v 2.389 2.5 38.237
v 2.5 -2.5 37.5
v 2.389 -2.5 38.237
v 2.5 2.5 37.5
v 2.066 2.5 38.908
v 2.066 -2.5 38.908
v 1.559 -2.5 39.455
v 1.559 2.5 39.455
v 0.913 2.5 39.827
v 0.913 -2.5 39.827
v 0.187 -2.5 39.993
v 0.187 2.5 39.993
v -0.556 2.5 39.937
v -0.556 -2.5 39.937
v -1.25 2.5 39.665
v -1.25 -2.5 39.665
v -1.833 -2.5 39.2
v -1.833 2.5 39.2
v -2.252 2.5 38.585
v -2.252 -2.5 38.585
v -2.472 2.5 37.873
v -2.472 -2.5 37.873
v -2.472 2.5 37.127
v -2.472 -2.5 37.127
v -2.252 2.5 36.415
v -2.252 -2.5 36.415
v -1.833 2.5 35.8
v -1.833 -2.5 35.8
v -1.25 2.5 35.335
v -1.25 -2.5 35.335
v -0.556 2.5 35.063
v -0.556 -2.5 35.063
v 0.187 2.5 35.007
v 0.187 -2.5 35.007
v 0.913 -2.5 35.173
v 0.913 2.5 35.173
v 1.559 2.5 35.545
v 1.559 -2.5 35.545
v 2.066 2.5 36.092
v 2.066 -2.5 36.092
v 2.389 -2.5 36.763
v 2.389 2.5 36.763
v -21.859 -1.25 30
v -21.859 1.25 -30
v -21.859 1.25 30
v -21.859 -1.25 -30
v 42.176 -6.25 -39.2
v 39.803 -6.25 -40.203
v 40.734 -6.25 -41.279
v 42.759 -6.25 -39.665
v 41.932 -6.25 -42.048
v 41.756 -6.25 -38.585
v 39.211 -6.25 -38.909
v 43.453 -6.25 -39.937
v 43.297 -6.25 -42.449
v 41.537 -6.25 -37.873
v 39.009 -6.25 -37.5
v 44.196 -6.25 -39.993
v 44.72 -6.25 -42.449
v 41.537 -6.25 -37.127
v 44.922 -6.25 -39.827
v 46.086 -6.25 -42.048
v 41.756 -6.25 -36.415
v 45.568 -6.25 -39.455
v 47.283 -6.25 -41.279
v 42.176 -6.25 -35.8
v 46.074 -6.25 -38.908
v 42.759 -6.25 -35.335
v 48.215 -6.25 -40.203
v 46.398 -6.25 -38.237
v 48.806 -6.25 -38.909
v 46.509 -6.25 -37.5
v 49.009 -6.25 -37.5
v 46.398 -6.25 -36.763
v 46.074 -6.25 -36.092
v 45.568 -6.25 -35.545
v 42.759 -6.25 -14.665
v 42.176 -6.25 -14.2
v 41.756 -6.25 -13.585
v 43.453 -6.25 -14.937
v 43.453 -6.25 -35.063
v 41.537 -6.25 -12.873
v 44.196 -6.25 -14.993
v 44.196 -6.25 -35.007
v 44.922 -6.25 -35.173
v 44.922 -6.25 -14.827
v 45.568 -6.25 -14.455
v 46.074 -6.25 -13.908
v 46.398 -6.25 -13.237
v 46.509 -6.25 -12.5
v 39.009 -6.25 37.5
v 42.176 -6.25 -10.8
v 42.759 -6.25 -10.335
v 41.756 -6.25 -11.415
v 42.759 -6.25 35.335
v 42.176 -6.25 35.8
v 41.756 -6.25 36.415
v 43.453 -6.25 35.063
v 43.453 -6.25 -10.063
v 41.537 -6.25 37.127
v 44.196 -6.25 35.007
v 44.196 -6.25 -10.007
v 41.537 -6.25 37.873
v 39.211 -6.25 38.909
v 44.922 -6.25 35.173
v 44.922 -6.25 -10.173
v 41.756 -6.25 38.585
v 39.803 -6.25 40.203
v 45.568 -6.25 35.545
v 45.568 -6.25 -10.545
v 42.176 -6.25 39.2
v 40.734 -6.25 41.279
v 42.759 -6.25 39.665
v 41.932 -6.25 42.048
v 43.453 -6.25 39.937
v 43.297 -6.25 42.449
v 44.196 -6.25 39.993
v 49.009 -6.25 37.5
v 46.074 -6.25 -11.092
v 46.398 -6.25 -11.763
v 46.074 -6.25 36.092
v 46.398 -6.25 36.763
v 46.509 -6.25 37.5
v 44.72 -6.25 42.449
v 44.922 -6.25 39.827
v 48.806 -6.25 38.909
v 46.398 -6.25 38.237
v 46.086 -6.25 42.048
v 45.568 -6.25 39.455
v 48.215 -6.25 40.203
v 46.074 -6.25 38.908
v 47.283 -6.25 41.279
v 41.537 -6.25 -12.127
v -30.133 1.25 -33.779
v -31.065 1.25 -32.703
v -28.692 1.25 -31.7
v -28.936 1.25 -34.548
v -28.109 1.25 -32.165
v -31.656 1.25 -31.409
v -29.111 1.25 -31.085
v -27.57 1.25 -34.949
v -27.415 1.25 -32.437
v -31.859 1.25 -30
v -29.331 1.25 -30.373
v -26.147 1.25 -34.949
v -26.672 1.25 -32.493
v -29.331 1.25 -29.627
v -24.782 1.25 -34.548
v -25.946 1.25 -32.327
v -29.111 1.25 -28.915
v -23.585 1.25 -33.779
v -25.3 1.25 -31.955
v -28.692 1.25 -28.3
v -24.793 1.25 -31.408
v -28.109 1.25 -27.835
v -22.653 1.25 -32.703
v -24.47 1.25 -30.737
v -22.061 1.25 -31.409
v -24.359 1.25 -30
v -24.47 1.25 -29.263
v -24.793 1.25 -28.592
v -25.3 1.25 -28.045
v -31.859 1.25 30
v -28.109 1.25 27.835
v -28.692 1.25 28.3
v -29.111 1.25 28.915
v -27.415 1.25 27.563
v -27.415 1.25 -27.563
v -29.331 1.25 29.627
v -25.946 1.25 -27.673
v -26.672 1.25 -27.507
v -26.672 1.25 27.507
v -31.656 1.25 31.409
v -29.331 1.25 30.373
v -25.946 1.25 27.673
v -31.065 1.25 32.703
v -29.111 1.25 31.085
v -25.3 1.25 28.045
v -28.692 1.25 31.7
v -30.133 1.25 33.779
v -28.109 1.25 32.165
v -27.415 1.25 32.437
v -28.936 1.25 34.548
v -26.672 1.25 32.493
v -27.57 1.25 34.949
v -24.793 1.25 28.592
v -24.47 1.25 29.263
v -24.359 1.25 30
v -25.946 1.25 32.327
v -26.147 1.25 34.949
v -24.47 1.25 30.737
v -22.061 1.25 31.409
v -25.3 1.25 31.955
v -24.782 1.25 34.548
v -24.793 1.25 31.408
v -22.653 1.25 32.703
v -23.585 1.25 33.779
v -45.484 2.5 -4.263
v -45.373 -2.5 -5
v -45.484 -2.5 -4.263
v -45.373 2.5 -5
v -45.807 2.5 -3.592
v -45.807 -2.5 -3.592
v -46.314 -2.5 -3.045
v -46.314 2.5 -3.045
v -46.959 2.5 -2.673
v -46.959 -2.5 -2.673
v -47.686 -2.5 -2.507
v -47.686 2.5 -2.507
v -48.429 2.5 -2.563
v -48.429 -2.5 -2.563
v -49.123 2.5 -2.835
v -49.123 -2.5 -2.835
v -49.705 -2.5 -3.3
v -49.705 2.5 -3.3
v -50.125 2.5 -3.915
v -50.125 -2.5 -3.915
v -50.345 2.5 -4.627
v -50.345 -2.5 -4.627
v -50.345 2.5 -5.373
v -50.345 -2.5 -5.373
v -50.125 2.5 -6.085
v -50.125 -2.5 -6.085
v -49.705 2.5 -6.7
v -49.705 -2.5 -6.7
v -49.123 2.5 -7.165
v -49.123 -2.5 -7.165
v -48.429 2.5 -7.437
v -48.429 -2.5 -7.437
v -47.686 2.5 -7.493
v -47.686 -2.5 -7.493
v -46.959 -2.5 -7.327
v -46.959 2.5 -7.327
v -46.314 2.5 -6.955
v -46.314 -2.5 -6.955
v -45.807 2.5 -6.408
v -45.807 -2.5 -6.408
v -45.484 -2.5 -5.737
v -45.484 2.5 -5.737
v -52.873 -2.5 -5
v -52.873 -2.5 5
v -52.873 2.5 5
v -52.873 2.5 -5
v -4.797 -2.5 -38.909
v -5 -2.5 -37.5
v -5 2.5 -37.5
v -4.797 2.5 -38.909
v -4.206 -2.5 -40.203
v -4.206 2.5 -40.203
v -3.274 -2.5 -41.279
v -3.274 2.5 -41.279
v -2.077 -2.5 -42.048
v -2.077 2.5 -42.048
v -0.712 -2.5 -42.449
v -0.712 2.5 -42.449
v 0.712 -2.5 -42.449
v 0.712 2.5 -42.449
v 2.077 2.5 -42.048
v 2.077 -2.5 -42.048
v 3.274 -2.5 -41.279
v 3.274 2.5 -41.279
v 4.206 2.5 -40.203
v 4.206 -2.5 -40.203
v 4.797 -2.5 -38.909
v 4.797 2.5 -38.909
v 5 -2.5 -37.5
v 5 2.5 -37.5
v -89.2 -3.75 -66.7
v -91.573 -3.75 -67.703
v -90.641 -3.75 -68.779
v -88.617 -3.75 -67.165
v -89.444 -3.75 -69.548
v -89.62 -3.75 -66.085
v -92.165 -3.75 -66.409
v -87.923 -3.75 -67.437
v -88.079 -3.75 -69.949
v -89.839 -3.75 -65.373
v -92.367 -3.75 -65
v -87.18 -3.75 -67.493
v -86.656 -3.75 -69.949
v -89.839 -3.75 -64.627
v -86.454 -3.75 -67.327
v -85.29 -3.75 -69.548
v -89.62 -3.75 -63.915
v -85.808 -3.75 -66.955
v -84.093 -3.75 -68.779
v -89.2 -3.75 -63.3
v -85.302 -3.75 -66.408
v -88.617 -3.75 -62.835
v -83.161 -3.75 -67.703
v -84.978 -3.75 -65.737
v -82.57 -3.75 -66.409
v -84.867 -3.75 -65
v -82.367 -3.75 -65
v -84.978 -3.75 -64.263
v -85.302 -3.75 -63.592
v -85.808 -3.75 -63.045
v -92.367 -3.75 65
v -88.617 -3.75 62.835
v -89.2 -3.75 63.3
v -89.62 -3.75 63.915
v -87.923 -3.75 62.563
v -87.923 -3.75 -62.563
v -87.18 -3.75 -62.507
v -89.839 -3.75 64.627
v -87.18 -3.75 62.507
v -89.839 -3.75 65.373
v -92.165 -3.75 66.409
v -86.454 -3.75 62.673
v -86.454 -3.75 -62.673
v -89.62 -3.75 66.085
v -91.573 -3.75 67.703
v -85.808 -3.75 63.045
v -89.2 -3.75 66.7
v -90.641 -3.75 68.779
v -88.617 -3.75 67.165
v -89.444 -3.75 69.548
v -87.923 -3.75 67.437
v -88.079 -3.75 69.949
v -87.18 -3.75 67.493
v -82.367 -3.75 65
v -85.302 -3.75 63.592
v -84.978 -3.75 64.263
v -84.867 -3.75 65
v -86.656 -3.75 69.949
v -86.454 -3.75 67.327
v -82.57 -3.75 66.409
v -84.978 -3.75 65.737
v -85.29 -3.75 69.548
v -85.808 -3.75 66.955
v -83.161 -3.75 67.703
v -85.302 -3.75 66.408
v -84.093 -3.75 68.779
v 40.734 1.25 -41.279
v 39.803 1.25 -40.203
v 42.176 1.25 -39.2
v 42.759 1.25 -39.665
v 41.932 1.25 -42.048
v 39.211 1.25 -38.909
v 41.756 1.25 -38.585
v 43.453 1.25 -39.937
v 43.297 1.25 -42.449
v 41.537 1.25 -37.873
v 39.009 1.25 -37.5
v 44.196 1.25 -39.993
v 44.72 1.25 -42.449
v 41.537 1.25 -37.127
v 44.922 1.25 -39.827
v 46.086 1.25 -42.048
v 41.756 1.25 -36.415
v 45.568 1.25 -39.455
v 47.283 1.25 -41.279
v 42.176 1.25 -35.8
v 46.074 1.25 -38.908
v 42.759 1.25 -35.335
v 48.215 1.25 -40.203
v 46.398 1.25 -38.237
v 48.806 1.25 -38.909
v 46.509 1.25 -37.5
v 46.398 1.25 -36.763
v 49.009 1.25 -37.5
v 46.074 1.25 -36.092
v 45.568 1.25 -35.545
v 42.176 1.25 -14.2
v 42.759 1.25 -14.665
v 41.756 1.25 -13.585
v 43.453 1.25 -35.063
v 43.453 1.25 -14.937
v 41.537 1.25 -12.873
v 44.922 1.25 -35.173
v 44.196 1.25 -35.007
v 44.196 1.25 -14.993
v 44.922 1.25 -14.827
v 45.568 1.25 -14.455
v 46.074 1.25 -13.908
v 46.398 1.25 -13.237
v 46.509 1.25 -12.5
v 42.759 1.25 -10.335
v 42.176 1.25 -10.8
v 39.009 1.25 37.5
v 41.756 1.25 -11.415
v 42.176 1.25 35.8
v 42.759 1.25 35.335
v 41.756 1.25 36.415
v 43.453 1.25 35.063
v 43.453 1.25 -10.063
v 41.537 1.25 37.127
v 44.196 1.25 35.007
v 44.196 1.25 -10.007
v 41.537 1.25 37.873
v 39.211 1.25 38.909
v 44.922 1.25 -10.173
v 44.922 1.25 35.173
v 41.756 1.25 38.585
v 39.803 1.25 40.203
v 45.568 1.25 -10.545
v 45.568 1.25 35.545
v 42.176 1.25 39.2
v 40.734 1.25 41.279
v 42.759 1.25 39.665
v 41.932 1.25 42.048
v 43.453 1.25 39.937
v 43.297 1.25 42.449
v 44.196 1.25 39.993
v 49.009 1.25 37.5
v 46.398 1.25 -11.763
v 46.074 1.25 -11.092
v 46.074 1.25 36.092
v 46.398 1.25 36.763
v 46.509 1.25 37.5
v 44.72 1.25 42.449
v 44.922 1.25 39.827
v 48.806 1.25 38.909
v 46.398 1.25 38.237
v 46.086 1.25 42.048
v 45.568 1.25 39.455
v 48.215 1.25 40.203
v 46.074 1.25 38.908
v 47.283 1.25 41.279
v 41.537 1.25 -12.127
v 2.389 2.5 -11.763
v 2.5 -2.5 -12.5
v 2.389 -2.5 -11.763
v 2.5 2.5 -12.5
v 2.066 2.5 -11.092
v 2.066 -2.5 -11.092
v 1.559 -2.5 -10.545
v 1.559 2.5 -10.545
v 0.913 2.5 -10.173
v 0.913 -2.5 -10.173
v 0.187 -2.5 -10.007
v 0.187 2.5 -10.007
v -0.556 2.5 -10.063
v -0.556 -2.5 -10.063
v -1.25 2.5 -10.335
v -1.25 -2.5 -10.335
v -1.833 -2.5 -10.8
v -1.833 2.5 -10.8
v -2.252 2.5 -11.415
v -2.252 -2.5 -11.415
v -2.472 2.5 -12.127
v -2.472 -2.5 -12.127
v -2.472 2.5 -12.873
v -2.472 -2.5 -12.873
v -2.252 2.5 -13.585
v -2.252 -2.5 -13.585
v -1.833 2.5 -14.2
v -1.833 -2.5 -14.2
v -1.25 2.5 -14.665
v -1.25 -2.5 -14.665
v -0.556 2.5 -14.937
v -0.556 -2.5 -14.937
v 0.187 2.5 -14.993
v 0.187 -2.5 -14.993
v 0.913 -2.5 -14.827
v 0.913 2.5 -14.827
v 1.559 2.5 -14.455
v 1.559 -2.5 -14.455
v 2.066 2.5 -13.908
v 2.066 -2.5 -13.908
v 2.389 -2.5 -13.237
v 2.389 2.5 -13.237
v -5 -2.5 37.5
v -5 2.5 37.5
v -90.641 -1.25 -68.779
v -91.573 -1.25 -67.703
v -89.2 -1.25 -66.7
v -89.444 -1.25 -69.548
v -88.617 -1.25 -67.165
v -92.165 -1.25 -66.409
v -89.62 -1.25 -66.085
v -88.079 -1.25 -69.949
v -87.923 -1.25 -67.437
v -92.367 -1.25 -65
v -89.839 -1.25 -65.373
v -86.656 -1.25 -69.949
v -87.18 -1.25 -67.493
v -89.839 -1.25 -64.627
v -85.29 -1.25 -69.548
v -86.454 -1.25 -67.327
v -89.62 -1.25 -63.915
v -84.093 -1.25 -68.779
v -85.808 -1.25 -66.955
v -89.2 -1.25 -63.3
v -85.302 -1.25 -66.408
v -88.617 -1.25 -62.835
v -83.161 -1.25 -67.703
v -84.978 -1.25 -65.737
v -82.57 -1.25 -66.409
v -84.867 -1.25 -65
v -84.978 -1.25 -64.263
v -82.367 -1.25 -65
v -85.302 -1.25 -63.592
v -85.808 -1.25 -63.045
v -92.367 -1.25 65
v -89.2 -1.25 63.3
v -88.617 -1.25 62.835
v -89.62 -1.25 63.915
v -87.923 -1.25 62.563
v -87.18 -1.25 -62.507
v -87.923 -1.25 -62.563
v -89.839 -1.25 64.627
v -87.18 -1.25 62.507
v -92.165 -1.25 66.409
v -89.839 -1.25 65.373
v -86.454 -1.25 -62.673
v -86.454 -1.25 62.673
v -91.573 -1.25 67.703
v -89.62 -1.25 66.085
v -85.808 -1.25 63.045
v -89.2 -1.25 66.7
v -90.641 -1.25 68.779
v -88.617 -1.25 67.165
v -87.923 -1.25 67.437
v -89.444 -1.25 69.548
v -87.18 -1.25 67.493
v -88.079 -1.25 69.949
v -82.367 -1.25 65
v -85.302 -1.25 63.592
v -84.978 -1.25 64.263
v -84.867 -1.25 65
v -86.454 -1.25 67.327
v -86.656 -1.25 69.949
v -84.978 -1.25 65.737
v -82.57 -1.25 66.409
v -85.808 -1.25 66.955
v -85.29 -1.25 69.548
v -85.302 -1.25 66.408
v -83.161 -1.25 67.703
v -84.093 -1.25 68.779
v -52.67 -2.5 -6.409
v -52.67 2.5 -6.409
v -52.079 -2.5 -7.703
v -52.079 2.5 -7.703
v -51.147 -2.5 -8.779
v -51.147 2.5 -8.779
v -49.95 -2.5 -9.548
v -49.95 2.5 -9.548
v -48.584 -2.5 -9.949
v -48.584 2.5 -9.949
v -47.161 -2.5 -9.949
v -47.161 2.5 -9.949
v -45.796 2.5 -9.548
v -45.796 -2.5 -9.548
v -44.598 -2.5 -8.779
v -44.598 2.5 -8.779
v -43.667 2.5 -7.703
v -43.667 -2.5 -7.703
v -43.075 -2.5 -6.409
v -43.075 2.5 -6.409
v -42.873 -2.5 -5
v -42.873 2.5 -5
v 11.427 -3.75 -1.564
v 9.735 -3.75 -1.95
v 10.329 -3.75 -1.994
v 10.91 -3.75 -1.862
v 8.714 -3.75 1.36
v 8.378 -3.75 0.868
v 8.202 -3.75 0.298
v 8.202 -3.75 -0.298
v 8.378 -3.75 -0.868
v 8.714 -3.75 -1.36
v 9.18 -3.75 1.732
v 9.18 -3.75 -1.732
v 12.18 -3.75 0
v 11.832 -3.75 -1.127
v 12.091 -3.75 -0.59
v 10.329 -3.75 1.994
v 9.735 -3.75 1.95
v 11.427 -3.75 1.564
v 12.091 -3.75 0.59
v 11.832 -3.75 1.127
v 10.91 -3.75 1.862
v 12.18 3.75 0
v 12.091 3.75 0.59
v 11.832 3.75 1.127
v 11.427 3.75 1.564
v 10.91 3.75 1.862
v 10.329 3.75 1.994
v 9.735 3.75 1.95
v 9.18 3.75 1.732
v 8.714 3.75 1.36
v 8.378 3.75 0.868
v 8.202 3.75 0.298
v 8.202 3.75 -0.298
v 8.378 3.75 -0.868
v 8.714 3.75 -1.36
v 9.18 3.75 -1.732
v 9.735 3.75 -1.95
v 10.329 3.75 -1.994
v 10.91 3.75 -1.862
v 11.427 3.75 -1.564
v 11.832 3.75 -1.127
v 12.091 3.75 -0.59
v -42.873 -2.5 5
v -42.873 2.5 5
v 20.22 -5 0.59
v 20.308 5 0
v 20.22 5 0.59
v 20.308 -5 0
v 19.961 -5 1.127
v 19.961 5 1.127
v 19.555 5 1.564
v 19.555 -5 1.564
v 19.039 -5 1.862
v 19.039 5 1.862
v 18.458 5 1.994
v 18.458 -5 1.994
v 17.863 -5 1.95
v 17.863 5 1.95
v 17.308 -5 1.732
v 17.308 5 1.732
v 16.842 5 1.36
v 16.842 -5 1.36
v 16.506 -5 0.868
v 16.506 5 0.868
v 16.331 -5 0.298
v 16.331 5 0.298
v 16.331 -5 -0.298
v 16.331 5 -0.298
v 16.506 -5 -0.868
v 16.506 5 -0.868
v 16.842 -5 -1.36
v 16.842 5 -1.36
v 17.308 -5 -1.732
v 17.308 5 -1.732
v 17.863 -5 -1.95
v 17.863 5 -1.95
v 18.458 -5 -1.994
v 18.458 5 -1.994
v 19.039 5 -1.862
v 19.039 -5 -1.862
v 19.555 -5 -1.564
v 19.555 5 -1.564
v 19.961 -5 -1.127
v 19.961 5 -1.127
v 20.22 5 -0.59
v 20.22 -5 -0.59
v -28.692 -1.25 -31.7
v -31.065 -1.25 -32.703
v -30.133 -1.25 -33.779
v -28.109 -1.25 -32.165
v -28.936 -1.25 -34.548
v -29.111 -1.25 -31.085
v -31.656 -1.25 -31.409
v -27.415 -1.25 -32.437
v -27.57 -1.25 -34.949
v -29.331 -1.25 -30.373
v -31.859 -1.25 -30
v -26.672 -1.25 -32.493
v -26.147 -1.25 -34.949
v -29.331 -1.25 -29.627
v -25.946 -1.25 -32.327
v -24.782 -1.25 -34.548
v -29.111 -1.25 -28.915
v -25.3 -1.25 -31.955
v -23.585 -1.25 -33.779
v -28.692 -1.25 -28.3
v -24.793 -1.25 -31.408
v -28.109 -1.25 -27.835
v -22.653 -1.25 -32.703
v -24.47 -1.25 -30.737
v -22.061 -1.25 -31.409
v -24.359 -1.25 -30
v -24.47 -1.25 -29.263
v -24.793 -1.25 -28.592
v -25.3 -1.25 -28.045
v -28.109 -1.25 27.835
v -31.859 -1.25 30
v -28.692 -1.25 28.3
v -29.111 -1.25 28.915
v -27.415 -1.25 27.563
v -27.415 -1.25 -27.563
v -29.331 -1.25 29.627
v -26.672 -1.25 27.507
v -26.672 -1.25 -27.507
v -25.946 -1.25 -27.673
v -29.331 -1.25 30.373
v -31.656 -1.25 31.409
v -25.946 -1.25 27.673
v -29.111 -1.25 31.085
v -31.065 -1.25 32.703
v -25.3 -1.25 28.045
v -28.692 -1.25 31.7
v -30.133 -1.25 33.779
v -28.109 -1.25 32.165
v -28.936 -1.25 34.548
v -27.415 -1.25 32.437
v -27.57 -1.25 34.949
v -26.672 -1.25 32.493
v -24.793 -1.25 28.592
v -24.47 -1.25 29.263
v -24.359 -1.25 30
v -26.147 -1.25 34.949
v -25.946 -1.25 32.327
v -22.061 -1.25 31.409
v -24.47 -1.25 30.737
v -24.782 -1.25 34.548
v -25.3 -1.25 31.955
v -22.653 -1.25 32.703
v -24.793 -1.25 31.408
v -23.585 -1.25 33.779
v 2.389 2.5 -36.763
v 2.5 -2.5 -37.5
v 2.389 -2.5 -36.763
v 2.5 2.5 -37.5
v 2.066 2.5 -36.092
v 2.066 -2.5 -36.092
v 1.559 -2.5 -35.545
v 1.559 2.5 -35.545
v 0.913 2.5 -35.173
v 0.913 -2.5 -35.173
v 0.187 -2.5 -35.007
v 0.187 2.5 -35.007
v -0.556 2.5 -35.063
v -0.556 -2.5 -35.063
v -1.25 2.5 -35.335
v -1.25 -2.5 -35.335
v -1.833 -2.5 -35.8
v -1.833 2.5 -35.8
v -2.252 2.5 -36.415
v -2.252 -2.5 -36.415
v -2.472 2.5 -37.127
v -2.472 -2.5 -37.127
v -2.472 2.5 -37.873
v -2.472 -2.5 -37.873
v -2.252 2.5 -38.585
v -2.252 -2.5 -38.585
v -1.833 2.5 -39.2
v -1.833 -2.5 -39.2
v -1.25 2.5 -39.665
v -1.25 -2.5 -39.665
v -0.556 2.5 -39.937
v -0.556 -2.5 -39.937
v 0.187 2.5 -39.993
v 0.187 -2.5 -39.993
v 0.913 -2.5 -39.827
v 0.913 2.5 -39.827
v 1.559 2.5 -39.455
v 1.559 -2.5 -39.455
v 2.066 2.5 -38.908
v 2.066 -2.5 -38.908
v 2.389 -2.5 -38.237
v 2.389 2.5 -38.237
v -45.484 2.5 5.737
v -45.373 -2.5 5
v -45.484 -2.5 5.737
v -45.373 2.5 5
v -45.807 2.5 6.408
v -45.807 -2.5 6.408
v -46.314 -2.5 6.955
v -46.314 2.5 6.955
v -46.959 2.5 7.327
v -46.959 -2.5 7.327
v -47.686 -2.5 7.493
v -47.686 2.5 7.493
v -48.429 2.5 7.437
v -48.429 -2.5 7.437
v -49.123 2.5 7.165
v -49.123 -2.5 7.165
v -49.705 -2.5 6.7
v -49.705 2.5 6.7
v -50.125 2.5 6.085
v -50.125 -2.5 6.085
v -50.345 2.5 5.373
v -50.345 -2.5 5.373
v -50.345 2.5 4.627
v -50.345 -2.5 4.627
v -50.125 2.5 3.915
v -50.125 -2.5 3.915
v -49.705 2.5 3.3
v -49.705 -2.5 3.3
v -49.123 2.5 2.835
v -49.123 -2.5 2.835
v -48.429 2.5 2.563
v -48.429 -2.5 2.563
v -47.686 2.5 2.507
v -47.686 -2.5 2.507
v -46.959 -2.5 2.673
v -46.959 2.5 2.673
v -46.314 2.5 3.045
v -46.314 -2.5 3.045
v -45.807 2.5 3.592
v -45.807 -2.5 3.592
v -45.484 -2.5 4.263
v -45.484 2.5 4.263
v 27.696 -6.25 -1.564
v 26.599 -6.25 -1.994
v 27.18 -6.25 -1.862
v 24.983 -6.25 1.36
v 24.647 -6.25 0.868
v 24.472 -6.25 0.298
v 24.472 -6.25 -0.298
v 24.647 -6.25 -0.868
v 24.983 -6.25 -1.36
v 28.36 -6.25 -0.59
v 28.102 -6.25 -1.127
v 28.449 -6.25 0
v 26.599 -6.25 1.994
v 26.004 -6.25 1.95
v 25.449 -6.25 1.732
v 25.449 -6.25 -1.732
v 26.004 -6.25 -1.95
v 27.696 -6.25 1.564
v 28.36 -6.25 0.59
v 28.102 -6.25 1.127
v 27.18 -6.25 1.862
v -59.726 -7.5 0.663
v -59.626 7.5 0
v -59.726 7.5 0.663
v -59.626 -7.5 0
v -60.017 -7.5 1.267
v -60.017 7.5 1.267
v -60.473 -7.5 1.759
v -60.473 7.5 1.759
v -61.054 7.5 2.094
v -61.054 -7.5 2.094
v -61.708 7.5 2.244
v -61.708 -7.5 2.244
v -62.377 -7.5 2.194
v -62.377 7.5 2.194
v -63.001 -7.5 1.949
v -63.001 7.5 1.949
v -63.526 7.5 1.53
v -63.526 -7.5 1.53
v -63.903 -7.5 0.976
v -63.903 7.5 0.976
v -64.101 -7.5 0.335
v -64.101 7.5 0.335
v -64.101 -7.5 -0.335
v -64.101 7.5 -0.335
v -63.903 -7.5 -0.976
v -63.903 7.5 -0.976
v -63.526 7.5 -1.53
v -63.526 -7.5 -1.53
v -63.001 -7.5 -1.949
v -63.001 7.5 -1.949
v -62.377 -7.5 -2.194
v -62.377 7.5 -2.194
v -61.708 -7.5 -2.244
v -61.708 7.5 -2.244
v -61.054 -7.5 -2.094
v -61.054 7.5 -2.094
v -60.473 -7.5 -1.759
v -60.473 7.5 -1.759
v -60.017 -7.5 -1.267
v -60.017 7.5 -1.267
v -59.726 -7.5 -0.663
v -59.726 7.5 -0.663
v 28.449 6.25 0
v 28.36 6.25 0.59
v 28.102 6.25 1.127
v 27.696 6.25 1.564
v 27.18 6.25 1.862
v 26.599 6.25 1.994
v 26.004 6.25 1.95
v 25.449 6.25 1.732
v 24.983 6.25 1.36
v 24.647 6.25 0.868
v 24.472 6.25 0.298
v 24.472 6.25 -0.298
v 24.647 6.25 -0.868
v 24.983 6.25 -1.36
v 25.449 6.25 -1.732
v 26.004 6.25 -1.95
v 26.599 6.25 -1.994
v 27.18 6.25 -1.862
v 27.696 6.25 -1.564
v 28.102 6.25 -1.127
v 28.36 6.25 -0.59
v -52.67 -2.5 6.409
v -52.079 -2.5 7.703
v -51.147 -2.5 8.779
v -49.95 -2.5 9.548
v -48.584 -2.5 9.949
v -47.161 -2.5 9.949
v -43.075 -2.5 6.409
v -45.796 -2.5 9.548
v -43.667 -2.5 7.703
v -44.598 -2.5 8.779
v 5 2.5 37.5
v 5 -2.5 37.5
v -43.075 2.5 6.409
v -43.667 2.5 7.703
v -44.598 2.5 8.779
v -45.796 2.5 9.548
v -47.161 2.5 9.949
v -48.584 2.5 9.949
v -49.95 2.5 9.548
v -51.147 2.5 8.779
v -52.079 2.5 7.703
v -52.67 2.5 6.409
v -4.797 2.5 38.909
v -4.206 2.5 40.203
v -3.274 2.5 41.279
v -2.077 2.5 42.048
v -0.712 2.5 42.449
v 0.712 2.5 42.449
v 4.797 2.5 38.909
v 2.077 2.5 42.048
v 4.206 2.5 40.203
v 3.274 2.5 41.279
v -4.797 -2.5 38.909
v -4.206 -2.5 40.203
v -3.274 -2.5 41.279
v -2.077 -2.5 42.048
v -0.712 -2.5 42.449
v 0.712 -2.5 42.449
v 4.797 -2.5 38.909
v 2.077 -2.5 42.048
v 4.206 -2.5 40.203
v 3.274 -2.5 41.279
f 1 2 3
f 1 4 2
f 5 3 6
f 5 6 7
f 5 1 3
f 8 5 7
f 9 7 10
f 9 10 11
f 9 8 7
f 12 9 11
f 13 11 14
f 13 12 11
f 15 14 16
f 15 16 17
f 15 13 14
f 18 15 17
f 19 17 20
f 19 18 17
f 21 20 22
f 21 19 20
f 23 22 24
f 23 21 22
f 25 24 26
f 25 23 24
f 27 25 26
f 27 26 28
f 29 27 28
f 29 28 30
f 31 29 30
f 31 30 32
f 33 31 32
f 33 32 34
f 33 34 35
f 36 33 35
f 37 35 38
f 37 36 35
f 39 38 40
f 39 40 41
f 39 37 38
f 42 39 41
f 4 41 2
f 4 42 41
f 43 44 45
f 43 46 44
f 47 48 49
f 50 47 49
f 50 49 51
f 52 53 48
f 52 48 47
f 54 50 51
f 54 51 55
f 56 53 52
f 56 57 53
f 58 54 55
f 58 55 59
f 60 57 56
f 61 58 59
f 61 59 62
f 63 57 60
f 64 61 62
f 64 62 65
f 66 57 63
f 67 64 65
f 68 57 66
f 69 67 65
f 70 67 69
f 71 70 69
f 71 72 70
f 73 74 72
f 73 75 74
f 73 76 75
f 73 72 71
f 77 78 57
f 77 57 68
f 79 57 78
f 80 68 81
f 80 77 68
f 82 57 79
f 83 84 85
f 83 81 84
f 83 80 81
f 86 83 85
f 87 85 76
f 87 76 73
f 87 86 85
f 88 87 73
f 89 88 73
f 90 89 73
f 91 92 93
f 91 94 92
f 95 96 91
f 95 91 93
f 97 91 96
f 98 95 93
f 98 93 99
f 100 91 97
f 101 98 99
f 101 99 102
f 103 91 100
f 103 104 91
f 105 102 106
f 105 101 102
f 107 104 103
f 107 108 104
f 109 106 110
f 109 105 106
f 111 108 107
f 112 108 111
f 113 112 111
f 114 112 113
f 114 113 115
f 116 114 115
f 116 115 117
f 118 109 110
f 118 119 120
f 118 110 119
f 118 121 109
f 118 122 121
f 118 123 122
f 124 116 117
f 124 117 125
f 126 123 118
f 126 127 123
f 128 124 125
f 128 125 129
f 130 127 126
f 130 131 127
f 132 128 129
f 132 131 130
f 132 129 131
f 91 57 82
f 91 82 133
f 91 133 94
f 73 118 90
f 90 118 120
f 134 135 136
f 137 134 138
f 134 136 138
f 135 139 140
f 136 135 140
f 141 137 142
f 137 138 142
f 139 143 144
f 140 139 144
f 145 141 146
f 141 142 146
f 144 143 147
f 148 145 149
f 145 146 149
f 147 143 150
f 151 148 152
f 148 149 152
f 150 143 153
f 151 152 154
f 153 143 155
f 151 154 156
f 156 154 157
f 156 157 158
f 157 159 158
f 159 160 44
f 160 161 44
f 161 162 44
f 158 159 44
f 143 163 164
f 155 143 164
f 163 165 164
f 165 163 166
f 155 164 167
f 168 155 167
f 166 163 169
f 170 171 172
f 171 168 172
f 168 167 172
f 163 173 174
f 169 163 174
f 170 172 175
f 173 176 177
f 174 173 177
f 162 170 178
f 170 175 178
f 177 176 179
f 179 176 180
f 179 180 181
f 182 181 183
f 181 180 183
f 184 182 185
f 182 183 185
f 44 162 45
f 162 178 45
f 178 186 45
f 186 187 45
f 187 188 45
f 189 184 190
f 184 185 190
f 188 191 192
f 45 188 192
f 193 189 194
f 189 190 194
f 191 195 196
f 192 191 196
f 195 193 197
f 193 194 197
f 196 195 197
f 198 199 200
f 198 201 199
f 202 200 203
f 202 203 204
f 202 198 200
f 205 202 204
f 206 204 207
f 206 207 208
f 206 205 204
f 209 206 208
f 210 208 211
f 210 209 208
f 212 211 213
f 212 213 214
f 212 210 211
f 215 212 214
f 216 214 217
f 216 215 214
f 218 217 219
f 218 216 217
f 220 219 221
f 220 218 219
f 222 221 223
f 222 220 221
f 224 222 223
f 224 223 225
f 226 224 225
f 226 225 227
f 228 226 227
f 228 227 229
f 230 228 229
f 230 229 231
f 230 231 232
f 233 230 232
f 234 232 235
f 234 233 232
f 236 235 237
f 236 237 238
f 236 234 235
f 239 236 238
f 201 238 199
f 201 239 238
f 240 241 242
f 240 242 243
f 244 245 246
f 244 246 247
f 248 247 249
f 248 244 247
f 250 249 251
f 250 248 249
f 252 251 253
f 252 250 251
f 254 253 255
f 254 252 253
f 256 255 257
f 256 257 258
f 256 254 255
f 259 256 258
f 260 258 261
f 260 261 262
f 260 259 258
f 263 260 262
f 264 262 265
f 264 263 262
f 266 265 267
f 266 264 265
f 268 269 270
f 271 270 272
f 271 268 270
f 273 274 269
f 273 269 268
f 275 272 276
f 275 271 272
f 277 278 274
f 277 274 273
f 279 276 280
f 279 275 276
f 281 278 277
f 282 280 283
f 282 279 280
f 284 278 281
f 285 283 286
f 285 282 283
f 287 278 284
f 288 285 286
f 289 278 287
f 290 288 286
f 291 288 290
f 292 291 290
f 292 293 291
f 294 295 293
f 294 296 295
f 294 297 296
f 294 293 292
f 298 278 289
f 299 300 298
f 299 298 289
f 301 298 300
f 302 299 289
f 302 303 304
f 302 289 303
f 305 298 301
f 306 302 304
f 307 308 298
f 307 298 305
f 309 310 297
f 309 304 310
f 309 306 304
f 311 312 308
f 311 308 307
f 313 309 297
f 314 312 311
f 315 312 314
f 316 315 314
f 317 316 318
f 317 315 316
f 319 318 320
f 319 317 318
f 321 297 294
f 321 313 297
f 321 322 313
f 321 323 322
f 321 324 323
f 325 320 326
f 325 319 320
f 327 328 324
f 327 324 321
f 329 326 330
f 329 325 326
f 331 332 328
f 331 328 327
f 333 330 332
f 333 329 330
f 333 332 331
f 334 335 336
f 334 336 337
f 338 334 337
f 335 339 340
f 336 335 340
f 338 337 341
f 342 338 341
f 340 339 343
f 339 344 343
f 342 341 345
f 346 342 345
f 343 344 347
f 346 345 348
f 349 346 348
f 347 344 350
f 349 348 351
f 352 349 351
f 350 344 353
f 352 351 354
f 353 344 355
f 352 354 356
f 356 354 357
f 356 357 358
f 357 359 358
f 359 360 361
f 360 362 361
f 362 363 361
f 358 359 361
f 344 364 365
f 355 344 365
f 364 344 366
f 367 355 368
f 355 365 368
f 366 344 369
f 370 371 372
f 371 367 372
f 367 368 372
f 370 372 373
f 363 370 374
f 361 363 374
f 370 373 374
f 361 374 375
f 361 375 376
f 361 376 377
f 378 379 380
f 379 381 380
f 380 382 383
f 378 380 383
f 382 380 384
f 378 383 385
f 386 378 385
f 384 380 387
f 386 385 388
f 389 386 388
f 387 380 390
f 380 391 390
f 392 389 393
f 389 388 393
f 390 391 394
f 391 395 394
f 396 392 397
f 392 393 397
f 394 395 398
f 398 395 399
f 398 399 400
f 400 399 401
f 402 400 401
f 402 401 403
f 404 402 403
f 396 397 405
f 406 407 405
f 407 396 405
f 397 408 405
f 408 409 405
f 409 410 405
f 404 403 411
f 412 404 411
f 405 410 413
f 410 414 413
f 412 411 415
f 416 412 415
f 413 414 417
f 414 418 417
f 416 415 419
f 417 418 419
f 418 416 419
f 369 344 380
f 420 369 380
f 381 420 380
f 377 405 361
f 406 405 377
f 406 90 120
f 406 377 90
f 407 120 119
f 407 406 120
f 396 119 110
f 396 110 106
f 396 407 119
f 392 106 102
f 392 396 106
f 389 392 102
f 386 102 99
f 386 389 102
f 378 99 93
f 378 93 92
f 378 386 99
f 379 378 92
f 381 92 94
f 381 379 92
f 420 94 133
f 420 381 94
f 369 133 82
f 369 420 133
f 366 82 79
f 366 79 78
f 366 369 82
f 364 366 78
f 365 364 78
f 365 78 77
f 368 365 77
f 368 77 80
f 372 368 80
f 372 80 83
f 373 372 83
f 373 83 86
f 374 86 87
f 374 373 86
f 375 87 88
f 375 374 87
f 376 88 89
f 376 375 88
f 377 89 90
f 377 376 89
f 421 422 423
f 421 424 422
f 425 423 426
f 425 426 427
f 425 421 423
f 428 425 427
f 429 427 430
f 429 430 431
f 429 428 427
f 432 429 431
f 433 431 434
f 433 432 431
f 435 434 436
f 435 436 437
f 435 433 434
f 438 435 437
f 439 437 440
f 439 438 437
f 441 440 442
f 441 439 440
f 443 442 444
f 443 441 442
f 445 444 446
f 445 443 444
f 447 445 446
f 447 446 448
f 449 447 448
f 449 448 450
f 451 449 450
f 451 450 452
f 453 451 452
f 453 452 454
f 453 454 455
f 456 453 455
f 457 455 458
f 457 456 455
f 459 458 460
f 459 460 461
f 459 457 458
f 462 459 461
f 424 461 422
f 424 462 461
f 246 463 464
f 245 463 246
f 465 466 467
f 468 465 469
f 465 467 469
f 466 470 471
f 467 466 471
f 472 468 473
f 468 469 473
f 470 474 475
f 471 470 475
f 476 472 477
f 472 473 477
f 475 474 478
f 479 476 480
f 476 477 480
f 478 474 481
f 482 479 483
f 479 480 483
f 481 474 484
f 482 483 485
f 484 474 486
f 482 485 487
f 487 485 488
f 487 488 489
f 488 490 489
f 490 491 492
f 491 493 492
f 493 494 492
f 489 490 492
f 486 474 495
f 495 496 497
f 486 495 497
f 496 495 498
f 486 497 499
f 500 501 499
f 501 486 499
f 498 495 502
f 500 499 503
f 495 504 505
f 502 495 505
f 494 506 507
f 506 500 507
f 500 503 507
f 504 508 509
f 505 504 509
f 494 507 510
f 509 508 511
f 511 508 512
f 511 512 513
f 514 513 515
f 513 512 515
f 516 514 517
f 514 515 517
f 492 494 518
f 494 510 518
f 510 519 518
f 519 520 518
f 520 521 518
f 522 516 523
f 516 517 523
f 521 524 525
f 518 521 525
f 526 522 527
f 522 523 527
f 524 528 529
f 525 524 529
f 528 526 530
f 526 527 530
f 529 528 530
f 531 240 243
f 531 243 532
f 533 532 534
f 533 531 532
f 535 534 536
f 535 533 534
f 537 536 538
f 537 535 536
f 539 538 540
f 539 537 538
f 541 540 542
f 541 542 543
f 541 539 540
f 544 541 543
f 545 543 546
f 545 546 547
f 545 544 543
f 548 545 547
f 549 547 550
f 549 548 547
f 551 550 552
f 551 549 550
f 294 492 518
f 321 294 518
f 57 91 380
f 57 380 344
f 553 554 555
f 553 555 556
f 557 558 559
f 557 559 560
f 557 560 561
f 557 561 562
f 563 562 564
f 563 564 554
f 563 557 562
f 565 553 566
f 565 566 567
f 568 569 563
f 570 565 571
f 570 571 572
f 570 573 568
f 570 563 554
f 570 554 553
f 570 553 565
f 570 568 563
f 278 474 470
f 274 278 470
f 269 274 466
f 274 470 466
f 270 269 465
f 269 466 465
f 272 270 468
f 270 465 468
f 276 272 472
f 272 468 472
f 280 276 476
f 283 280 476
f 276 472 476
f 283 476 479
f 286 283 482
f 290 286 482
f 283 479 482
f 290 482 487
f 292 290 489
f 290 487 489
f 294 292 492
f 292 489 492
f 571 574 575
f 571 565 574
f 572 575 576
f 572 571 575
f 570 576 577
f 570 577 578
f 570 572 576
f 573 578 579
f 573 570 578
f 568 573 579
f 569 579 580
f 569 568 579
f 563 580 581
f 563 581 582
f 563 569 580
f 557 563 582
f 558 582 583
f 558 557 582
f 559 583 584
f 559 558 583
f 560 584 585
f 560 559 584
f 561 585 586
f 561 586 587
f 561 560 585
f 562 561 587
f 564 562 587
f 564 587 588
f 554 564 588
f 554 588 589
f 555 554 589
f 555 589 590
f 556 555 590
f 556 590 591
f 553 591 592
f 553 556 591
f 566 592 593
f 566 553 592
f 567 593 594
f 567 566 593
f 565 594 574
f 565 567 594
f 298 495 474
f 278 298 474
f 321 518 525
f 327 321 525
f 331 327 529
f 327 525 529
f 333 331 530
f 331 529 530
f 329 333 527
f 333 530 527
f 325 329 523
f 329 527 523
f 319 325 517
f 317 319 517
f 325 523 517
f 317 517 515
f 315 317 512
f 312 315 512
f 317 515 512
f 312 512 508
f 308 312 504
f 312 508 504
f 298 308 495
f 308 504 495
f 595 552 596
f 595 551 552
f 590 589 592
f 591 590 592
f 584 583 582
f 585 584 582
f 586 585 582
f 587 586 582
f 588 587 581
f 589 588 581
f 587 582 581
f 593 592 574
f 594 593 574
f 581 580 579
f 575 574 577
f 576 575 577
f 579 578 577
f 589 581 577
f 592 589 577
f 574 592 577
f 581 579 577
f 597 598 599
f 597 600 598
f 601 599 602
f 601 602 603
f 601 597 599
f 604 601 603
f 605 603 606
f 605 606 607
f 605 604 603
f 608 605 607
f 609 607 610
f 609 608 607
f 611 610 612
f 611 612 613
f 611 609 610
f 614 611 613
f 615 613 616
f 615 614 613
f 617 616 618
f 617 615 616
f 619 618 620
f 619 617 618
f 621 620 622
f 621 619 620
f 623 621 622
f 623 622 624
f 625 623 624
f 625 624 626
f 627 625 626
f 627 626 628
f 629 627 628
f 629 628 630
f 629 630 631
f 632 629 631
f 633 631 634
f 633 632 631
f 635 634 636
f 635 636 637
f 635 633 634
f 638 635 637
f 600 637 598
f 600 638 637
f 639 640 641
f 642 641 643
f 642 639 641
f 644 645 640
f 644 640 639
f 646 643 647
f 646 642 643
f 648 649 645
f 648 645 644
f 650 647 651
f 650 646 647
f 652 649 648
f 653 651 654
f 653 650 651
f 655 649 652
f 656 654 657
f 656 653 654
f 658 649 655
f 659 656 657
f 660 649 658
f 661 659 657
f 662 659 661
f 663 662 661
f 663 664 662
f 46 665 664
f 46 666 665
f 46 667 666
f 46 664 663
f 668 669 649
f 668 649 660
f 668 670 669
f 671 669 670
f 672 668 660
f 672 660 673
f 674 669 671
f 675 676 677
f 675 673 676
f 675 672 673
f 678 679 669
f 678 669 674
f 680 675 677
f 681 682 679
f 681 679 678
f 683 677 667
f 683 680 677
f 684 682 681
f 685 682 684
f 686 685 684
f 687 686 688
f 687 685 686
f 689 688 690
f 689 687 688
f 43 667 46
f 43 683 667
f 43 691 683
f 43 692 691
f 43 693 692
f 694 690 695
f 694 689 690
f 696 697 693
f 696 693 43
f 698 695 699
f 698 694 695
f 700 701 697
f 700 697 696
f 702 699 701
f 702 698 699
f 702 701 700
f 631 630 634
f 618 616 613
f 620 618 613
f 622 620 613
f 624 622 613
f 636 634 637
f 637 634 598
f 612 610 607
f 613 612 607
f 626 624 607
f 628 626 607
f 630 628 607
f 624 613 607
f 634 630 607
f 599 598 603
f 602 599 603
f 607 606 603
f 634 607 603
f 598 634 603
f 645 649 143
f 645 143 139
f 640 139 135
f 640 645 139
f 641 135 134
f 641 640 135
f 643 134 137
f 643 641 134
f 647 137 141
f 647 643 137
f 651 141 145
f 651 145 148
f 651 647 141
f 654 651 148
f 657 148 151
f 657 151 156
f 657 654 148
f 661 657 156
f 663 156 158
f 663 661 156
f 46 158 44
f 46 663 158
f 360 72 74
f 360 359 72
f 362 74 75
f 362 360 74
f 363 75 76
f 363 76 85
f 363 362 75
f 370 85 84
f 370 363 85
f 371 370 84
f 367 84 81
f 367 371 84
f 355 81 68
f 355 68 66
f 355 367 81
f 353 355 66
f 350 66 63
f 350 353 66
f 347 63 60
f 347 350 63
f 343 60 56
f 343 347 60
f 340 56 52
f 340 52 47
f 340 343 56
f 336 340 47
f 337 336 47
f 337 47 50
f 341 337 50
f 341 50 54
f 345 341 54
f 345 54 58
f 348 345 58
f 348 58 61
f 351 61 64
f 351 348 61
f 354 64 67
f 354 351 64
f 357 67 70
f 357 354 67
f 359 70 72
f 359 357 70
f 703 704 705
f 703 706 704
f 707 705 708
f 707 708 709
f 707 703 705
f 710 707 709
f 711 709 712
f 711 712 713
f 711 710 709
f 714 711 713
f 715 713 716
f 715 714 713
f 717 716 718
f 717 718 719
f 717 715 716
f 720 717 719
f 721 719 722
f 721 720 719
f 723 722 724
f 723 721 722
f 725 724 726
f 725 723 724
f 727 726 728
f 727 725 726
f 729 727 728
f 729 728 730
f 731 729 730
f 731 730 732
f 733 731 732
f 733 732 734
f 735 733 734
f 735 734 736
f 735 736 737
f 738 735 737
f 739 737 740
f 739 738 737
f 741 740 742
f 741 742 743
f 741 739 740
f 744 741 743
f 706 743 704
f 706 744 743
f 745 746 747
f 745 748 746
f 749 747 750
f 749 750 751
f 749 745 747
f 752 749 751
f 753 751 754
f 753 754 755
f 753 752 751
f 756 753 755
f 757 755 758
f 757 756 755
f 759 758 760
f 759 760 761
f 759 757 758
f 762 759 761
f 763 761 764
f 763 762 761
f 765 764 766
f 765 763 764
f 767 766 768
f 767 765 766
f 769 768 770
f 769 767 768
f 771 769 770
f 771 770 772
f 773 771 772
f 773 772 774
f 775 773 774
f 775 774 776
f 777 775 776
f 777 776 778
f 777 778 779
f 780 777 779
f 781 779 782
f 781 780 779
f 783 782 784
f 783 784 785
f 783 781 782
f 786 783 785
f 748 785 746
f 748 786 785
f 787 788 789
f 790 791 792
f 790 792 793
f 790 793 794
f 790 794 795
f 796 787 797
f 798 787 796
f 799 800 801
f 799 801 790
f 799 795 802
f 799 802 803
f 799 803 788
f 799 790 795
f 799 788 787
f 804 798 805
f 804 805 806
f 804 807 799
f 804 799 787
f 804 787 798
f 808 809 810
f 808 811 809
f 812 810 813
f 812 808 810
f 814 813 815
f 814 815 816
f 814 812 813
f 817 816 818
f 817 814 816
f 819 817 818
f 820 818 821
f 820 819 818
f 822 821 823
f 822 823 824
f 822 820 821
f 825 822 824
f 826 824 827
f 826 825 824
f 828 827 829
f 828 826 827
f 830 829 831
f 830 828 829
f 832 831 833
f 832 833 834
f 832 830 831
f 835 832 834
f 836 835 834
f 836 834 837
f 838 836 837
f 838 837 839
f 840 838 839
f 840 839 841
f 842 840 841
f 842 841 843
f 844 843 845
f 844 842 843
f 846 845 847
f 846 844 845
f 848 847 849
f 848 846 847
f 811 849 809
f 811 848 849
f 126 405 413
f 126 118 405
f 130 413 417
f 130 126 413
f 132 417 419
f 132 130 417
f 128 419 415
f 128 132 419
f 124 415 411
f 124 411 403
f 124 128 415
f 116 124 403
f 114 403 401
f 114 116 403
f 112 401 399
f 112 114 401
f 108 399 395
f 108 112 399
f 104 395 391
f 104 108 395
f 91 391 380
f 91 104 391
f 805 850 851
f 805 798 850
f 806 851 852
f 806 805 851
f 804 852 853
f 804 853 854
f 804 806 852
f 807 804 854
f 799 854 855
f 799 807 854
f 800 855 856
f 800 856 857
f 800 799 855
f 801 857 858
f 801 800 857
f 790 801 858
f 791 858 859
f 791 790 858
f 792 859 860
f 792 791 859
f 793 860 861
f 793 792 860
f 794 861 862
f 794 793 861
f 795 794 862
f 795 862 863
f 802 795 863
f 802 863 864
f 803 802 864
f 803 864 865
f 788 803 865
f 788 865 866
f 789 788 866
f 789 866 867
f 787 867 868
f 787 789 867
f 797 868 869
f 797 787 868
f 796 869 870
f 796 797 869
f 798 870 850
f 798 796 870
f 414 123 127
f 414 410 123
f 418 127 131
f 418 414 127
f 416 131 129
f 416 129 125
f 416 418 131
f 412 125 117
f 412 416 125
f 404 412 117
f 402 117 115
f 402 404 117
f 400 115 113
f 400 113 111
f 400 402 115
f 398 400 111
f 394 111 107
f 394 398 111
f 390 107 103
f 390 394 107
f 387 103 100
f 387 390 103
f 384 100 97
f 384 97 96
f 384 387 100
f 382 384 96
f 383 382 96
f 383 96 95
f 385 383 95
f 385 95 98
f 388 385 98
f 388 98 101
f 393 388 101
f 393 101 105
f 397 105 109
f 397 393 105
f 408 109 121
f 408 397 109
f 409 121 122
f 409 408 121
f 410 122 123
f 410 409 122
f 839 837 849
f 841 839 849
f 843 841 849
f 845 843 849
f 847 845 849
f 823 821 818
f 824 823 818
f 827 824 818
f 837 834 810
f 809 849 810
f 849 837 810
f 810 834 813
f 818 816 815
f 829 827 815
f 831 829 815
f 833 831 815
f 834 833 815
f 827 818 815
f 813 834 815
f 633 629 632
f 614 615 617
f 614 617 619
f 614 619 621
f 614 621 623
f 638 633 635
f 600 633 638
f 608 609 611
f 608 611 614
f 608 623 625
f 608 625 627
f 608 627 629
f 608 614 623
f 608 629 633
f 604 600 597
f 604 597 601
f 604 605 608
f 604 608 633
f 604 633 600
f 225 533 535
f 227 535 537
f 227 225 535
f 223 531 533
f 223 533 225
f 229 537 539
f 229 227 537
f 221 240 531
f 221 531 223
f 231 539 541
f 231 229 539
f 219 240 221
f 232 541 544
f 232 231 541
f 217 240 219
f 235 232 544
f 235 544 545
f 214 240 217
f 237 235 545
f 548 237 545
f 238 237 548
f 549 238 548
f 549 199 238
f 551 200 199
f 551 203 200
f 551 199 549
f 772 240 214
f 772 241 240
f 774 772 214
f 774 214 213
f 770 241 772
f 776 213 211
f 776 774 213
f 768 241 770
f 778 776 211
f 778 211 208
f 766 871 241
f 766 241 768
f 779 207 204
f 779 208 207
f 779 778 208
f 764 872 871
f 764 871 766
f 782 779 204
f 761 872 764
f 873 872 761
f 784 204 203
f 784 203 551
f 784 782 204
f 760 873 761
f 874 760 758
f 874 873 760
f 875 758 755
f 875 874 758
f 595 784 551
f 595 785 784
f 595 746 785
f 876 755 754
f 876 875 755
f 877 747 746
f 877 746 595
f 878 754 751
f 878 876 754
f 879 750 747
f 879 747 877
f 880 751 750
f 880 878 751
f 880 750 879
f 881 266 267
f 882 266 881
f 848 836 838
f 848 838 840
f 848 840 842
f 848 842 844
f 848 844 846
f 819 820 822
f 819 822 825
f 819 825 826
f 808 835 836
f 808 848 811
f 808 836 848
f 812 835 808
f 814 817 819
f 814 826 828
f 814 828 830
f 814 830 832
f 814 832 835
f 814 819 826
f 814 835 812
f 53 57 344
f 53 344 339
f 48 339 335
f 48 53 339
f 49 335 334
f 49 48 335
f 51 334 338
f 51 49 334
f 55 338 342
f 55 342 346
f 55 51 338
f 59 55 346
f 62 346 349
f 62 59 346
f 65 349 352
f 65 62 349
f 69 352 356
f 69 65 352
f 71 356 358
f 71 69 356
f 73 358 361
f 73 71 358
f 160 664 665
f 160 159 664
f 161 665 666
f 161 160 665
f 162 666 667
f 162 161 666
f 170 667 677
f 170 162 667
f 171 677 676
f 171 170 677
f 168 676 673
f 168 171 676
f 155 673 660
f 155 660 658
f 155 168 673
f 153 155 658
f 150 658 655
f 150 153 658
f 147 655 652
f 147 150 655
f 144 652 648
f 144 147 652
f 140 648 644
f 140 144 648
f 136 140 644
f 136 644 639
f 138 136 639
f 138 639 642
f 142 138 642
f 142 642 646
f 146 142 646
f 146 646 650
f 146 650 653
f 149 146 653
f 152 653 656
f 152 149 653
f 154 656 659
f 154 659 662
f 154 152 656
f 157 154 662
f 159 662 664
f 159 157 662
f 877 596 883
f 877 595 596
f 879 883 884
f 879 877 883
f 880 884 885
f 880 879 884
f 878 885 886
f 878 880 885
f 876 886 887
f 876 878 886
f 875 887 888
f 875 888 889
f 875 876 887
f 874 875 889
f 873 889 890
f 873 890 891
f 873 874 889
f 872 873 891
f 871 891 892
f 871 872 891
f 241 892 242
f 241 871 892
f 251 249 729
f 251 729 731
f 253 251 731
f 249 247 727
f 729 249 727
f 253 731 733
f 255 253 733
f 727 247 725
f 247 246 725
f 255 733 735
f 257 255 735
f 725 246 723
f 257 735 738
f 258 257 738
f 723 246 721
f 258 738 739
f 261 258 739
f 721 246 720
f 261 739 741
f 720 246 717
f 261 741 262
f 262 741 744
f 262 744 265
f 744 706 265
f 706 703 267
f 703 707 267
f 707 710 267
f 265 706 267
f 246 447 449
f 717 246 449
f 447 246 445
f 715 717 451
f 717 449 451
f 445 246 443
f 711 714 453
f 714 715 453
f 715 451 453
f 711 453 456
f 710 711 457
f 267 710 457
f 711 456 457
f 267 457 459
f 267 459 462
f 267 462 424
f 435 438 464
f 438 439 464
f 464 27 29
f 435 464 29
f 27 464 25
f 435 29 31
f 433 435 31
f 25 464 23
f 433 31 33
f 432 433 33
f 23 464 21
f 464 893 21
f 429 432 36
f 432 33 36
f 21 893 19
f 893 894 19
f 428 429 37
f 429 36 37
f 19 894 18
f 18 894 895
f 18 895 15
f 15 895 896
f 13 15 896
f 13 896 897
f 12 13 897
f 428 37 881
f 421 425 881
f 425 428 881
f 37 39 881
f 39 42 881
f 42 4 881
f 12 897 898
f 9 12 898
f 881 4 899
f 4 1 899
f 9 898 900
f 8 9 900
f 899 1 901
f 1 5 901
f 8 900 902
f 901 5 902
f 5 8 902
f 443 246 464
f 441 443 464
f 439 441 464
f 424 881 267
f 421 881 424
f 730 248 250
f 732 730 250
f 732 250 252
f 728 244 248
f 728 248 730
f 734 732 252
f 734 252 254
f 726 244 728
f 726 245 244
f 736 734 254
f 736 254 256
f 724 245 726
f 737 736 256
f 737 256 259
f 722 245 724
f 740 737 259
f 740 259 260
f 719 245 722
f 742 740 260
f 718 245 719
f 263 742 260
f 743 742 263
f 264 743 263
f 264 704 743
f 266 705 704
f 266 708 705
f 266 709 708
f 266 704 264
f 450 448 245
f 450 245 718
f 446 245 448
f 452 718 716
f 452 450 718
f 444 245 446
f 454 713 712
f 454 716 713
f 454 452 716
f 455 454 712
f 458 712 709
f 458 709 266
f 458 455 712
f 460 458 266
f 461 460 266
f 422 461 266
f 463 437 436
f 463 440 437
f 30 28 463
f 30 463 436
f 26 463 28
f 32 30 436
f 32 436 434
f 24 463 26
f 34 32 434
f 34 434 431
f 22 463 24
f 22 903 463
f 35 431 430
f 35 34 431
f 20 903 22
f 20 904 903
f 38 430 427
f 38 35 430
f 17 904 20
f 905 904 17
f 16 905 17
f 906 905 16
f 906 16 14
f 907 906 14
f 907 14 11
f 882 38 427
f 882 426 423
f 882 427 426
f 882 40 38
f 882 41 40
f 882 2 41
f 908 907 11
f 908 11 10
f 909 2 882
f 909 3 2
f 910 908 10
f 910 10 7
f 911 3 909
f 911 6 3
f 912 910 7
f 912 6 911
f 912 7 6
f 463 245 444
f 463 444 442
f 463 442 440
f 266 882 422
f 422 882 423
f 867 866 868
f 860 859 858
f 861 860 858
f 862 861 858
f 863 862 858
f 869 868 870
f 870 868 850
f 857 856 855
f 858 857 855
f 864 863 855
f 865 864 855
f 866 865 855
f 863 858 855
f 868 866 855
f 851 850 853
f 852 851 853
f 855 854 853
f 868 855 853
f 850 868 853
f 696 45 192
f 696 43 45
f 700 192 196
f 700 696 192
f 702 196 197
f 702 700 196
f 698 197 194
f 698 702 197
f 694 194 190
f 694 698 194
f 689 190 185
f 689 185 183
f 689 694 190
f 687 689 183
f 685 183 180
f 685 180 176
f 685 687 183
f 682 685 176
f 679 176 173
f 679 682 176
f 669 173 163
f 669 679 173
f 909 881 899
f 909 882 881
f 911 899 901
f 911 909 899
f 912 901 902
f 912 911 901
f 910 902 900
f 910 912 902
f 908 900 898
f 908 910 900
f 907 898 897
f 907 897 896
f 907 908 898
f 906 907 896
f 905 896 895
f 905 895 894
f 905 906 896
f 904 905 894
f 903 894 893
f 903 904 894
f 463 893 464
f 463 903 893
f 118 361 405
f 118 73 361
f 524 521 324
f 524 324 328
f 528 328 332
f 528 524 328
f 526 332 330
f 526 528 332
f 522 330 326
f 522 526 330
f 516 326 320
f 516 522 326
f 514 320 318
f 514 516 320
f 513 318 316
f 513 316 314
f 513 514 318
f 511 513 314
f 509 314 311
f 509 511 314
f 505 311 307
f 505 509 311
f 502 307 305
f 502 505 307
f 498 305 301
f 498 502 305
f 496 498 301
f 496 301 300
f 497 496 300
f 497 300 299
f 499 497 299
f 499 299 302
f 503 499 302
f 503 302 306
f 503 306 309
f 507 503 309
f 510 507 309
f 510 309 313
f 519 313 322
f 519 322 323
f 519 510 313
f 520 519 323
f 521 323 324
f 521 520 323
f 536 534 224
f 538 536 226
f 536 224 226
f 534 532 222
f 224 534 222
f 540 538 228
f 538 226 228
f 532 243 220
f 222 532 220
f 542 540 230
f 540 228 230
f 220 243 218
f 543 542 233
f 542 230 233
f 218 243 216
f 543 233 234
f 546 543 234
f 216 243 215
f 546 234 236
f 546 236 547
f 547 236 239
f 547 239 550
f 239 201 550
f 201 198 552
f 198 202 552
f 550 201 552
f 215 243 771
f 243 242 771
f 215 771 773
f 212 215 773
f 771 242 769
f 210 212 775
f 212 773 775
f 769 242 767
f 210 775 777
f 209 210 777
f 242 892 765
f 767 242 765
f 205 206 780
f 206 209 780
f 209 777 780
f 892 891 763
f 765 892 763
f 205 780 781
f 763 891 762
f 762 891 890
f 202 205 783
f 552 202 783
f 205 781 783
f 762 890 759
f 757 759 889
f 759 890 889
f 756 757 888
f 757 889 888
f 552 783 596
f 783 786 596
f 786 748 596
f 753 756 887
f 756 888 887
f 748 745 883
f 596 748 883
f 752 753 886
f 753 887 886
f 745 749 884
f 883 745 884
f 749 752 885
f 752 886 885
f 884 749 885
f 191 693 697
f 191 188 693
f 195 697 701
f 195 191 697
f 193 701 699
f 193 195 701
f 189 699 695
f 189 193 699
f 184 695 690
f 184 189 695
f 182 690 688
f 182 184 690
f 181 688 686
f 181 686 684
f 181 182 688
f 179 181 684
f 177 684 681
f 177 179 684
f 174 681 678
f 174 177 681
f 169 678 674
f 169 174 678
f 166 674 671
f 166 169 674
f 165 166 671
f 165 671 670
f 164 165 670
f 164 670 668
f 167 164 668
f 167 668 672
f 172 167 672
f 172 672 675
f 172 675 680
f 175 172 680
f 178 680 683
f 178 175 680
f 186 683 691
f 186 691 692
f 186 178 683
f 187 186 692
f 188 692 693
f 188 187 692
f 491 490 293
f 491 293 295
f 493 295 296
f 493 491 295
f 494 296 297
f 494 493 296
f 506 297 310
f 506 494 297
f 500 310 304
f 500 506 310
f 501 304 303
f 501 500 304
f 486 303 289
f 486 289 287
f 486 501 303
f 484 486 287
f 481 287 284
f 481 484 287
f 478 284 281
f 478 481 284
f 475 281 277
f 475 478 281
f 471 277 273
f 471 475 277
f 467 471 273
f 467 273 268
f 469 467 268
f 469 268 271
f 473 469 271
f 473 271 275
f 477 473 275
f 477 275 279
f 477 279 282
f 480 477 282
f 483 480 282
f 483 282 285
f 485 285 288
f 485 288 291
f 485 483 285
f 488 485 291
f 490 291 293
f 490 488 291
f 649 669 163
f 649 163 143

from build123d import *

# Parameters (mm, degrees)
F2_R      = 2.5
F3_DEPTH  = 2.5
F4_R      = 2.5
F5_DEPTH  = 1.25
F6_R      = 2.5
F7_DEPTH  = 2.5
F8_R      = 2
F9_DEPTH  = 3.75
F10_R     = 2
F11_DEPTH = 5
F12_R     = 2.5
F13_DEPTH = 3.75
F14_R     = 2
F15_DEPTH = 6.25
F16_R     = 2.25
F17_DEPTH = 7.5
F18_R     = 2.5
F19_DEPTH = 2.5


with BuildPart() as f3:
    # F2 (on Front) → F3 (new body, symmetric)
    with BuildSketch(Plane.XZ):
        with BuildLine():
            Line((5, 0), (5, 37.5))
            ThreePointArc((5, 37.5), (0, 42.5), (-5, 37.5))
            Line((-5, 37.5), (-5, 0))
            Line((-5, 0), (-5, -37.5))
            ThreePointArc((-5, -37.5), (0, -42.5), (5, -37.5))
            Line((5, -37.5), (5, 0))
        make_face()
        with Locations((0, -37.5)):
            Circle(F2_R, mode=Mode.SUBTRACT)
        with Locations((0, -12.5)):
            Circle(F2_R, mode=Mode.SUBTRACT)
        with Locations((0, 37.5)):
            Circle(F2_R, mode=Mode.SUBTRACT)
    extrude(amount=F3_DEPTH, both=True)


with BuildPart() as f5:
    # F4 (on Front) → F5 (new body, symmetric)
    with BuildSketch(Plane.XZ):
        with BuildLine():
            Line((-21.8589119613, 0), (-21.8589119613, 30))
            ThreePointArc((-21.8589119613, 30), (-26.8589119613, 35), (-31.8589119613, 30))
            Line((-31.8589119613, 30), (-31.8589119613, 0))
            Line((-31.8589119613, 0), (-31.8589119613, -30))
            ThreePointArc((-31.8589119613, -30), (-26.8589119613, -35), (-21.8589119613, -30))
            Line((-21.8589119613, -30), (-21.8589119613, 0))
        make_face()
        with Locations((-26.8589119613, -30)):
            Circle(F4_R, mode=Mode.SUBTRACT)
        with Locations((-26.8589119613, 30)):
            Circle(F4_R, mode=Mode.SUBTRACT)
    extrude(amount=F5_DEPTH, both=True)


with BuildPart() as f7:
    # F6 (on Front) → F7 (new body, symmetric)
    with BuildSketch(Plane.XZ):
        with BuildLine():
            Line((-42.8727790713, 0), (-42.8727790713, 5))
            ThreePointArc((-42.8727790713, 5), (-47.8727790713, 10), (-52.8727790713, 5))
            Line((-52.8727790713, 5), (-52.8727790713, 0))
            Line((-52.8727790713, 0), (-52.8727790713, -5))
            ThreePointArc((-52.8727790713, -5), (-47.8727790713, -10), (-42.8727790713, -5))
            Line((-42.8727790713, -5), (-42.8727790713, 0))
        make_face()
        with Locations((-47.8727790713, -5)):
            Circle(F6_R, mode=Mode.SUBTRACT)
        with Locations((-47.8727790713, 5)):
            Circle(F6_R, mode=Mode.SUBTRACT)
    extrude(amount=F7_DEPTH, both=True)


with BuildPart() as f9:
    # F8 (on Front) → F9 (new body, symmetric)
    with BuildSketch(Plane.XZ):
        with Locations((10.1797801788, 0)):
            Circle(F8_R)
    extrude(amount=F9_DEPTH, both=True)


with BuildPart() as f11:
    # F10 (on Front) → F11 (new body, symmetric)
    with BuildSketch(Plane.XZ):
        with Locations((18.3083742857, 0)):
            Circle(F10_R)
    extrude(amount=F11_DEPTH, both=True)


with BuildPart() as f13:
    # F12 (on face) → F13 (new body, symmetric)
    with BuildSketch(Plane.XZ.offset(2.5)):
        with BuildLine():
            Line((49.0088026483, 0), (49.0088026483, 37.5))
            ThreePointArc((49.0088026483, 37.5), (44.0088026483, 42.5), (39.0088026483, 37.5))
            Line((39.0088026483, 37.5), (39.0088026483, 0))
            Line((39.0088026483, 0), (39.0088026483, -37.5))
            ThreePointArc((39.0088026483, -37.5), (44.0088026483, -42.5), (49.0088026483, -37.5))
            Line((49.0088026483, -37.5), (49.0088026483, 0))
        make_face()
        with Locations((44.0088026483, -37.5)):
            Circle(F12_R, mode=Mode.SUBTRACT)
        with Locations((44.0088026483, -12.5)):
            Circle(F12_R, mode=Mode.SUBTRACT)
        with Locations((44.0088026483, 37.5)):
            Circle(F12_R, mode=Mode.SUBTRACT)
    extrude(amount=F13_DEPTH, both=True)


with BuildPart() as f15:
    # F14 (on Front) → F15 (new body, symmetric)
    with BuildSketch(Plane.XZ):
        with Locations((26.4492426068, 0)):
            Circle(F14_R)
    extrude(amount=F15_DEPTH, both=True)


with BuildPart() as f17:
    # F16 (on Front) → F17 (new body, symmetric)
    with BuildSketch(Plane.XZ):
        with Locations((-61.8761591613, 0)):
            Circle(F16_R)
    extrude(amount=F17_DEPTH, both=True)


with BuildPart() as f19:
    # F18 (on face) → F19 (new body)
    with BuildSketch(Plane.XZ.offset(1.25)):
        with BuildLine():
            Line((-82.3671596532, 0), (-82.3671596532, 65))
            ThreePointArc((-82.3671596532, 65), (-87.3671596532, 70), (-92.3671596532, 65))
            Line((-92.3671596532, 65), (-92.3671596532, 0))
            Line((-92.3671596532, 0), (-92.3671596532, -65))
            ThreePointArc((-92.3671596532, -65), (-87.3671596532, -70), (-82.3671596532, -65))
            Line((-82.3671596532, -65), (-82.3671596532, 0))
        make_face()
        with Locations((-87.3671596532, -65)):
            Circle(F18_R, mode=Mode.SUBTRACT)
        with Locations((-87.3671596532, 65)):
            Circle(F18_R, mode=Mode.SUBTRACT)
    extrude(amount=F19_DEPTH)


solid = Compound([f3.part, f5.part, f7.part, f9.part, f11.part, f13.part, f15.part, f17.part, f19.part])
